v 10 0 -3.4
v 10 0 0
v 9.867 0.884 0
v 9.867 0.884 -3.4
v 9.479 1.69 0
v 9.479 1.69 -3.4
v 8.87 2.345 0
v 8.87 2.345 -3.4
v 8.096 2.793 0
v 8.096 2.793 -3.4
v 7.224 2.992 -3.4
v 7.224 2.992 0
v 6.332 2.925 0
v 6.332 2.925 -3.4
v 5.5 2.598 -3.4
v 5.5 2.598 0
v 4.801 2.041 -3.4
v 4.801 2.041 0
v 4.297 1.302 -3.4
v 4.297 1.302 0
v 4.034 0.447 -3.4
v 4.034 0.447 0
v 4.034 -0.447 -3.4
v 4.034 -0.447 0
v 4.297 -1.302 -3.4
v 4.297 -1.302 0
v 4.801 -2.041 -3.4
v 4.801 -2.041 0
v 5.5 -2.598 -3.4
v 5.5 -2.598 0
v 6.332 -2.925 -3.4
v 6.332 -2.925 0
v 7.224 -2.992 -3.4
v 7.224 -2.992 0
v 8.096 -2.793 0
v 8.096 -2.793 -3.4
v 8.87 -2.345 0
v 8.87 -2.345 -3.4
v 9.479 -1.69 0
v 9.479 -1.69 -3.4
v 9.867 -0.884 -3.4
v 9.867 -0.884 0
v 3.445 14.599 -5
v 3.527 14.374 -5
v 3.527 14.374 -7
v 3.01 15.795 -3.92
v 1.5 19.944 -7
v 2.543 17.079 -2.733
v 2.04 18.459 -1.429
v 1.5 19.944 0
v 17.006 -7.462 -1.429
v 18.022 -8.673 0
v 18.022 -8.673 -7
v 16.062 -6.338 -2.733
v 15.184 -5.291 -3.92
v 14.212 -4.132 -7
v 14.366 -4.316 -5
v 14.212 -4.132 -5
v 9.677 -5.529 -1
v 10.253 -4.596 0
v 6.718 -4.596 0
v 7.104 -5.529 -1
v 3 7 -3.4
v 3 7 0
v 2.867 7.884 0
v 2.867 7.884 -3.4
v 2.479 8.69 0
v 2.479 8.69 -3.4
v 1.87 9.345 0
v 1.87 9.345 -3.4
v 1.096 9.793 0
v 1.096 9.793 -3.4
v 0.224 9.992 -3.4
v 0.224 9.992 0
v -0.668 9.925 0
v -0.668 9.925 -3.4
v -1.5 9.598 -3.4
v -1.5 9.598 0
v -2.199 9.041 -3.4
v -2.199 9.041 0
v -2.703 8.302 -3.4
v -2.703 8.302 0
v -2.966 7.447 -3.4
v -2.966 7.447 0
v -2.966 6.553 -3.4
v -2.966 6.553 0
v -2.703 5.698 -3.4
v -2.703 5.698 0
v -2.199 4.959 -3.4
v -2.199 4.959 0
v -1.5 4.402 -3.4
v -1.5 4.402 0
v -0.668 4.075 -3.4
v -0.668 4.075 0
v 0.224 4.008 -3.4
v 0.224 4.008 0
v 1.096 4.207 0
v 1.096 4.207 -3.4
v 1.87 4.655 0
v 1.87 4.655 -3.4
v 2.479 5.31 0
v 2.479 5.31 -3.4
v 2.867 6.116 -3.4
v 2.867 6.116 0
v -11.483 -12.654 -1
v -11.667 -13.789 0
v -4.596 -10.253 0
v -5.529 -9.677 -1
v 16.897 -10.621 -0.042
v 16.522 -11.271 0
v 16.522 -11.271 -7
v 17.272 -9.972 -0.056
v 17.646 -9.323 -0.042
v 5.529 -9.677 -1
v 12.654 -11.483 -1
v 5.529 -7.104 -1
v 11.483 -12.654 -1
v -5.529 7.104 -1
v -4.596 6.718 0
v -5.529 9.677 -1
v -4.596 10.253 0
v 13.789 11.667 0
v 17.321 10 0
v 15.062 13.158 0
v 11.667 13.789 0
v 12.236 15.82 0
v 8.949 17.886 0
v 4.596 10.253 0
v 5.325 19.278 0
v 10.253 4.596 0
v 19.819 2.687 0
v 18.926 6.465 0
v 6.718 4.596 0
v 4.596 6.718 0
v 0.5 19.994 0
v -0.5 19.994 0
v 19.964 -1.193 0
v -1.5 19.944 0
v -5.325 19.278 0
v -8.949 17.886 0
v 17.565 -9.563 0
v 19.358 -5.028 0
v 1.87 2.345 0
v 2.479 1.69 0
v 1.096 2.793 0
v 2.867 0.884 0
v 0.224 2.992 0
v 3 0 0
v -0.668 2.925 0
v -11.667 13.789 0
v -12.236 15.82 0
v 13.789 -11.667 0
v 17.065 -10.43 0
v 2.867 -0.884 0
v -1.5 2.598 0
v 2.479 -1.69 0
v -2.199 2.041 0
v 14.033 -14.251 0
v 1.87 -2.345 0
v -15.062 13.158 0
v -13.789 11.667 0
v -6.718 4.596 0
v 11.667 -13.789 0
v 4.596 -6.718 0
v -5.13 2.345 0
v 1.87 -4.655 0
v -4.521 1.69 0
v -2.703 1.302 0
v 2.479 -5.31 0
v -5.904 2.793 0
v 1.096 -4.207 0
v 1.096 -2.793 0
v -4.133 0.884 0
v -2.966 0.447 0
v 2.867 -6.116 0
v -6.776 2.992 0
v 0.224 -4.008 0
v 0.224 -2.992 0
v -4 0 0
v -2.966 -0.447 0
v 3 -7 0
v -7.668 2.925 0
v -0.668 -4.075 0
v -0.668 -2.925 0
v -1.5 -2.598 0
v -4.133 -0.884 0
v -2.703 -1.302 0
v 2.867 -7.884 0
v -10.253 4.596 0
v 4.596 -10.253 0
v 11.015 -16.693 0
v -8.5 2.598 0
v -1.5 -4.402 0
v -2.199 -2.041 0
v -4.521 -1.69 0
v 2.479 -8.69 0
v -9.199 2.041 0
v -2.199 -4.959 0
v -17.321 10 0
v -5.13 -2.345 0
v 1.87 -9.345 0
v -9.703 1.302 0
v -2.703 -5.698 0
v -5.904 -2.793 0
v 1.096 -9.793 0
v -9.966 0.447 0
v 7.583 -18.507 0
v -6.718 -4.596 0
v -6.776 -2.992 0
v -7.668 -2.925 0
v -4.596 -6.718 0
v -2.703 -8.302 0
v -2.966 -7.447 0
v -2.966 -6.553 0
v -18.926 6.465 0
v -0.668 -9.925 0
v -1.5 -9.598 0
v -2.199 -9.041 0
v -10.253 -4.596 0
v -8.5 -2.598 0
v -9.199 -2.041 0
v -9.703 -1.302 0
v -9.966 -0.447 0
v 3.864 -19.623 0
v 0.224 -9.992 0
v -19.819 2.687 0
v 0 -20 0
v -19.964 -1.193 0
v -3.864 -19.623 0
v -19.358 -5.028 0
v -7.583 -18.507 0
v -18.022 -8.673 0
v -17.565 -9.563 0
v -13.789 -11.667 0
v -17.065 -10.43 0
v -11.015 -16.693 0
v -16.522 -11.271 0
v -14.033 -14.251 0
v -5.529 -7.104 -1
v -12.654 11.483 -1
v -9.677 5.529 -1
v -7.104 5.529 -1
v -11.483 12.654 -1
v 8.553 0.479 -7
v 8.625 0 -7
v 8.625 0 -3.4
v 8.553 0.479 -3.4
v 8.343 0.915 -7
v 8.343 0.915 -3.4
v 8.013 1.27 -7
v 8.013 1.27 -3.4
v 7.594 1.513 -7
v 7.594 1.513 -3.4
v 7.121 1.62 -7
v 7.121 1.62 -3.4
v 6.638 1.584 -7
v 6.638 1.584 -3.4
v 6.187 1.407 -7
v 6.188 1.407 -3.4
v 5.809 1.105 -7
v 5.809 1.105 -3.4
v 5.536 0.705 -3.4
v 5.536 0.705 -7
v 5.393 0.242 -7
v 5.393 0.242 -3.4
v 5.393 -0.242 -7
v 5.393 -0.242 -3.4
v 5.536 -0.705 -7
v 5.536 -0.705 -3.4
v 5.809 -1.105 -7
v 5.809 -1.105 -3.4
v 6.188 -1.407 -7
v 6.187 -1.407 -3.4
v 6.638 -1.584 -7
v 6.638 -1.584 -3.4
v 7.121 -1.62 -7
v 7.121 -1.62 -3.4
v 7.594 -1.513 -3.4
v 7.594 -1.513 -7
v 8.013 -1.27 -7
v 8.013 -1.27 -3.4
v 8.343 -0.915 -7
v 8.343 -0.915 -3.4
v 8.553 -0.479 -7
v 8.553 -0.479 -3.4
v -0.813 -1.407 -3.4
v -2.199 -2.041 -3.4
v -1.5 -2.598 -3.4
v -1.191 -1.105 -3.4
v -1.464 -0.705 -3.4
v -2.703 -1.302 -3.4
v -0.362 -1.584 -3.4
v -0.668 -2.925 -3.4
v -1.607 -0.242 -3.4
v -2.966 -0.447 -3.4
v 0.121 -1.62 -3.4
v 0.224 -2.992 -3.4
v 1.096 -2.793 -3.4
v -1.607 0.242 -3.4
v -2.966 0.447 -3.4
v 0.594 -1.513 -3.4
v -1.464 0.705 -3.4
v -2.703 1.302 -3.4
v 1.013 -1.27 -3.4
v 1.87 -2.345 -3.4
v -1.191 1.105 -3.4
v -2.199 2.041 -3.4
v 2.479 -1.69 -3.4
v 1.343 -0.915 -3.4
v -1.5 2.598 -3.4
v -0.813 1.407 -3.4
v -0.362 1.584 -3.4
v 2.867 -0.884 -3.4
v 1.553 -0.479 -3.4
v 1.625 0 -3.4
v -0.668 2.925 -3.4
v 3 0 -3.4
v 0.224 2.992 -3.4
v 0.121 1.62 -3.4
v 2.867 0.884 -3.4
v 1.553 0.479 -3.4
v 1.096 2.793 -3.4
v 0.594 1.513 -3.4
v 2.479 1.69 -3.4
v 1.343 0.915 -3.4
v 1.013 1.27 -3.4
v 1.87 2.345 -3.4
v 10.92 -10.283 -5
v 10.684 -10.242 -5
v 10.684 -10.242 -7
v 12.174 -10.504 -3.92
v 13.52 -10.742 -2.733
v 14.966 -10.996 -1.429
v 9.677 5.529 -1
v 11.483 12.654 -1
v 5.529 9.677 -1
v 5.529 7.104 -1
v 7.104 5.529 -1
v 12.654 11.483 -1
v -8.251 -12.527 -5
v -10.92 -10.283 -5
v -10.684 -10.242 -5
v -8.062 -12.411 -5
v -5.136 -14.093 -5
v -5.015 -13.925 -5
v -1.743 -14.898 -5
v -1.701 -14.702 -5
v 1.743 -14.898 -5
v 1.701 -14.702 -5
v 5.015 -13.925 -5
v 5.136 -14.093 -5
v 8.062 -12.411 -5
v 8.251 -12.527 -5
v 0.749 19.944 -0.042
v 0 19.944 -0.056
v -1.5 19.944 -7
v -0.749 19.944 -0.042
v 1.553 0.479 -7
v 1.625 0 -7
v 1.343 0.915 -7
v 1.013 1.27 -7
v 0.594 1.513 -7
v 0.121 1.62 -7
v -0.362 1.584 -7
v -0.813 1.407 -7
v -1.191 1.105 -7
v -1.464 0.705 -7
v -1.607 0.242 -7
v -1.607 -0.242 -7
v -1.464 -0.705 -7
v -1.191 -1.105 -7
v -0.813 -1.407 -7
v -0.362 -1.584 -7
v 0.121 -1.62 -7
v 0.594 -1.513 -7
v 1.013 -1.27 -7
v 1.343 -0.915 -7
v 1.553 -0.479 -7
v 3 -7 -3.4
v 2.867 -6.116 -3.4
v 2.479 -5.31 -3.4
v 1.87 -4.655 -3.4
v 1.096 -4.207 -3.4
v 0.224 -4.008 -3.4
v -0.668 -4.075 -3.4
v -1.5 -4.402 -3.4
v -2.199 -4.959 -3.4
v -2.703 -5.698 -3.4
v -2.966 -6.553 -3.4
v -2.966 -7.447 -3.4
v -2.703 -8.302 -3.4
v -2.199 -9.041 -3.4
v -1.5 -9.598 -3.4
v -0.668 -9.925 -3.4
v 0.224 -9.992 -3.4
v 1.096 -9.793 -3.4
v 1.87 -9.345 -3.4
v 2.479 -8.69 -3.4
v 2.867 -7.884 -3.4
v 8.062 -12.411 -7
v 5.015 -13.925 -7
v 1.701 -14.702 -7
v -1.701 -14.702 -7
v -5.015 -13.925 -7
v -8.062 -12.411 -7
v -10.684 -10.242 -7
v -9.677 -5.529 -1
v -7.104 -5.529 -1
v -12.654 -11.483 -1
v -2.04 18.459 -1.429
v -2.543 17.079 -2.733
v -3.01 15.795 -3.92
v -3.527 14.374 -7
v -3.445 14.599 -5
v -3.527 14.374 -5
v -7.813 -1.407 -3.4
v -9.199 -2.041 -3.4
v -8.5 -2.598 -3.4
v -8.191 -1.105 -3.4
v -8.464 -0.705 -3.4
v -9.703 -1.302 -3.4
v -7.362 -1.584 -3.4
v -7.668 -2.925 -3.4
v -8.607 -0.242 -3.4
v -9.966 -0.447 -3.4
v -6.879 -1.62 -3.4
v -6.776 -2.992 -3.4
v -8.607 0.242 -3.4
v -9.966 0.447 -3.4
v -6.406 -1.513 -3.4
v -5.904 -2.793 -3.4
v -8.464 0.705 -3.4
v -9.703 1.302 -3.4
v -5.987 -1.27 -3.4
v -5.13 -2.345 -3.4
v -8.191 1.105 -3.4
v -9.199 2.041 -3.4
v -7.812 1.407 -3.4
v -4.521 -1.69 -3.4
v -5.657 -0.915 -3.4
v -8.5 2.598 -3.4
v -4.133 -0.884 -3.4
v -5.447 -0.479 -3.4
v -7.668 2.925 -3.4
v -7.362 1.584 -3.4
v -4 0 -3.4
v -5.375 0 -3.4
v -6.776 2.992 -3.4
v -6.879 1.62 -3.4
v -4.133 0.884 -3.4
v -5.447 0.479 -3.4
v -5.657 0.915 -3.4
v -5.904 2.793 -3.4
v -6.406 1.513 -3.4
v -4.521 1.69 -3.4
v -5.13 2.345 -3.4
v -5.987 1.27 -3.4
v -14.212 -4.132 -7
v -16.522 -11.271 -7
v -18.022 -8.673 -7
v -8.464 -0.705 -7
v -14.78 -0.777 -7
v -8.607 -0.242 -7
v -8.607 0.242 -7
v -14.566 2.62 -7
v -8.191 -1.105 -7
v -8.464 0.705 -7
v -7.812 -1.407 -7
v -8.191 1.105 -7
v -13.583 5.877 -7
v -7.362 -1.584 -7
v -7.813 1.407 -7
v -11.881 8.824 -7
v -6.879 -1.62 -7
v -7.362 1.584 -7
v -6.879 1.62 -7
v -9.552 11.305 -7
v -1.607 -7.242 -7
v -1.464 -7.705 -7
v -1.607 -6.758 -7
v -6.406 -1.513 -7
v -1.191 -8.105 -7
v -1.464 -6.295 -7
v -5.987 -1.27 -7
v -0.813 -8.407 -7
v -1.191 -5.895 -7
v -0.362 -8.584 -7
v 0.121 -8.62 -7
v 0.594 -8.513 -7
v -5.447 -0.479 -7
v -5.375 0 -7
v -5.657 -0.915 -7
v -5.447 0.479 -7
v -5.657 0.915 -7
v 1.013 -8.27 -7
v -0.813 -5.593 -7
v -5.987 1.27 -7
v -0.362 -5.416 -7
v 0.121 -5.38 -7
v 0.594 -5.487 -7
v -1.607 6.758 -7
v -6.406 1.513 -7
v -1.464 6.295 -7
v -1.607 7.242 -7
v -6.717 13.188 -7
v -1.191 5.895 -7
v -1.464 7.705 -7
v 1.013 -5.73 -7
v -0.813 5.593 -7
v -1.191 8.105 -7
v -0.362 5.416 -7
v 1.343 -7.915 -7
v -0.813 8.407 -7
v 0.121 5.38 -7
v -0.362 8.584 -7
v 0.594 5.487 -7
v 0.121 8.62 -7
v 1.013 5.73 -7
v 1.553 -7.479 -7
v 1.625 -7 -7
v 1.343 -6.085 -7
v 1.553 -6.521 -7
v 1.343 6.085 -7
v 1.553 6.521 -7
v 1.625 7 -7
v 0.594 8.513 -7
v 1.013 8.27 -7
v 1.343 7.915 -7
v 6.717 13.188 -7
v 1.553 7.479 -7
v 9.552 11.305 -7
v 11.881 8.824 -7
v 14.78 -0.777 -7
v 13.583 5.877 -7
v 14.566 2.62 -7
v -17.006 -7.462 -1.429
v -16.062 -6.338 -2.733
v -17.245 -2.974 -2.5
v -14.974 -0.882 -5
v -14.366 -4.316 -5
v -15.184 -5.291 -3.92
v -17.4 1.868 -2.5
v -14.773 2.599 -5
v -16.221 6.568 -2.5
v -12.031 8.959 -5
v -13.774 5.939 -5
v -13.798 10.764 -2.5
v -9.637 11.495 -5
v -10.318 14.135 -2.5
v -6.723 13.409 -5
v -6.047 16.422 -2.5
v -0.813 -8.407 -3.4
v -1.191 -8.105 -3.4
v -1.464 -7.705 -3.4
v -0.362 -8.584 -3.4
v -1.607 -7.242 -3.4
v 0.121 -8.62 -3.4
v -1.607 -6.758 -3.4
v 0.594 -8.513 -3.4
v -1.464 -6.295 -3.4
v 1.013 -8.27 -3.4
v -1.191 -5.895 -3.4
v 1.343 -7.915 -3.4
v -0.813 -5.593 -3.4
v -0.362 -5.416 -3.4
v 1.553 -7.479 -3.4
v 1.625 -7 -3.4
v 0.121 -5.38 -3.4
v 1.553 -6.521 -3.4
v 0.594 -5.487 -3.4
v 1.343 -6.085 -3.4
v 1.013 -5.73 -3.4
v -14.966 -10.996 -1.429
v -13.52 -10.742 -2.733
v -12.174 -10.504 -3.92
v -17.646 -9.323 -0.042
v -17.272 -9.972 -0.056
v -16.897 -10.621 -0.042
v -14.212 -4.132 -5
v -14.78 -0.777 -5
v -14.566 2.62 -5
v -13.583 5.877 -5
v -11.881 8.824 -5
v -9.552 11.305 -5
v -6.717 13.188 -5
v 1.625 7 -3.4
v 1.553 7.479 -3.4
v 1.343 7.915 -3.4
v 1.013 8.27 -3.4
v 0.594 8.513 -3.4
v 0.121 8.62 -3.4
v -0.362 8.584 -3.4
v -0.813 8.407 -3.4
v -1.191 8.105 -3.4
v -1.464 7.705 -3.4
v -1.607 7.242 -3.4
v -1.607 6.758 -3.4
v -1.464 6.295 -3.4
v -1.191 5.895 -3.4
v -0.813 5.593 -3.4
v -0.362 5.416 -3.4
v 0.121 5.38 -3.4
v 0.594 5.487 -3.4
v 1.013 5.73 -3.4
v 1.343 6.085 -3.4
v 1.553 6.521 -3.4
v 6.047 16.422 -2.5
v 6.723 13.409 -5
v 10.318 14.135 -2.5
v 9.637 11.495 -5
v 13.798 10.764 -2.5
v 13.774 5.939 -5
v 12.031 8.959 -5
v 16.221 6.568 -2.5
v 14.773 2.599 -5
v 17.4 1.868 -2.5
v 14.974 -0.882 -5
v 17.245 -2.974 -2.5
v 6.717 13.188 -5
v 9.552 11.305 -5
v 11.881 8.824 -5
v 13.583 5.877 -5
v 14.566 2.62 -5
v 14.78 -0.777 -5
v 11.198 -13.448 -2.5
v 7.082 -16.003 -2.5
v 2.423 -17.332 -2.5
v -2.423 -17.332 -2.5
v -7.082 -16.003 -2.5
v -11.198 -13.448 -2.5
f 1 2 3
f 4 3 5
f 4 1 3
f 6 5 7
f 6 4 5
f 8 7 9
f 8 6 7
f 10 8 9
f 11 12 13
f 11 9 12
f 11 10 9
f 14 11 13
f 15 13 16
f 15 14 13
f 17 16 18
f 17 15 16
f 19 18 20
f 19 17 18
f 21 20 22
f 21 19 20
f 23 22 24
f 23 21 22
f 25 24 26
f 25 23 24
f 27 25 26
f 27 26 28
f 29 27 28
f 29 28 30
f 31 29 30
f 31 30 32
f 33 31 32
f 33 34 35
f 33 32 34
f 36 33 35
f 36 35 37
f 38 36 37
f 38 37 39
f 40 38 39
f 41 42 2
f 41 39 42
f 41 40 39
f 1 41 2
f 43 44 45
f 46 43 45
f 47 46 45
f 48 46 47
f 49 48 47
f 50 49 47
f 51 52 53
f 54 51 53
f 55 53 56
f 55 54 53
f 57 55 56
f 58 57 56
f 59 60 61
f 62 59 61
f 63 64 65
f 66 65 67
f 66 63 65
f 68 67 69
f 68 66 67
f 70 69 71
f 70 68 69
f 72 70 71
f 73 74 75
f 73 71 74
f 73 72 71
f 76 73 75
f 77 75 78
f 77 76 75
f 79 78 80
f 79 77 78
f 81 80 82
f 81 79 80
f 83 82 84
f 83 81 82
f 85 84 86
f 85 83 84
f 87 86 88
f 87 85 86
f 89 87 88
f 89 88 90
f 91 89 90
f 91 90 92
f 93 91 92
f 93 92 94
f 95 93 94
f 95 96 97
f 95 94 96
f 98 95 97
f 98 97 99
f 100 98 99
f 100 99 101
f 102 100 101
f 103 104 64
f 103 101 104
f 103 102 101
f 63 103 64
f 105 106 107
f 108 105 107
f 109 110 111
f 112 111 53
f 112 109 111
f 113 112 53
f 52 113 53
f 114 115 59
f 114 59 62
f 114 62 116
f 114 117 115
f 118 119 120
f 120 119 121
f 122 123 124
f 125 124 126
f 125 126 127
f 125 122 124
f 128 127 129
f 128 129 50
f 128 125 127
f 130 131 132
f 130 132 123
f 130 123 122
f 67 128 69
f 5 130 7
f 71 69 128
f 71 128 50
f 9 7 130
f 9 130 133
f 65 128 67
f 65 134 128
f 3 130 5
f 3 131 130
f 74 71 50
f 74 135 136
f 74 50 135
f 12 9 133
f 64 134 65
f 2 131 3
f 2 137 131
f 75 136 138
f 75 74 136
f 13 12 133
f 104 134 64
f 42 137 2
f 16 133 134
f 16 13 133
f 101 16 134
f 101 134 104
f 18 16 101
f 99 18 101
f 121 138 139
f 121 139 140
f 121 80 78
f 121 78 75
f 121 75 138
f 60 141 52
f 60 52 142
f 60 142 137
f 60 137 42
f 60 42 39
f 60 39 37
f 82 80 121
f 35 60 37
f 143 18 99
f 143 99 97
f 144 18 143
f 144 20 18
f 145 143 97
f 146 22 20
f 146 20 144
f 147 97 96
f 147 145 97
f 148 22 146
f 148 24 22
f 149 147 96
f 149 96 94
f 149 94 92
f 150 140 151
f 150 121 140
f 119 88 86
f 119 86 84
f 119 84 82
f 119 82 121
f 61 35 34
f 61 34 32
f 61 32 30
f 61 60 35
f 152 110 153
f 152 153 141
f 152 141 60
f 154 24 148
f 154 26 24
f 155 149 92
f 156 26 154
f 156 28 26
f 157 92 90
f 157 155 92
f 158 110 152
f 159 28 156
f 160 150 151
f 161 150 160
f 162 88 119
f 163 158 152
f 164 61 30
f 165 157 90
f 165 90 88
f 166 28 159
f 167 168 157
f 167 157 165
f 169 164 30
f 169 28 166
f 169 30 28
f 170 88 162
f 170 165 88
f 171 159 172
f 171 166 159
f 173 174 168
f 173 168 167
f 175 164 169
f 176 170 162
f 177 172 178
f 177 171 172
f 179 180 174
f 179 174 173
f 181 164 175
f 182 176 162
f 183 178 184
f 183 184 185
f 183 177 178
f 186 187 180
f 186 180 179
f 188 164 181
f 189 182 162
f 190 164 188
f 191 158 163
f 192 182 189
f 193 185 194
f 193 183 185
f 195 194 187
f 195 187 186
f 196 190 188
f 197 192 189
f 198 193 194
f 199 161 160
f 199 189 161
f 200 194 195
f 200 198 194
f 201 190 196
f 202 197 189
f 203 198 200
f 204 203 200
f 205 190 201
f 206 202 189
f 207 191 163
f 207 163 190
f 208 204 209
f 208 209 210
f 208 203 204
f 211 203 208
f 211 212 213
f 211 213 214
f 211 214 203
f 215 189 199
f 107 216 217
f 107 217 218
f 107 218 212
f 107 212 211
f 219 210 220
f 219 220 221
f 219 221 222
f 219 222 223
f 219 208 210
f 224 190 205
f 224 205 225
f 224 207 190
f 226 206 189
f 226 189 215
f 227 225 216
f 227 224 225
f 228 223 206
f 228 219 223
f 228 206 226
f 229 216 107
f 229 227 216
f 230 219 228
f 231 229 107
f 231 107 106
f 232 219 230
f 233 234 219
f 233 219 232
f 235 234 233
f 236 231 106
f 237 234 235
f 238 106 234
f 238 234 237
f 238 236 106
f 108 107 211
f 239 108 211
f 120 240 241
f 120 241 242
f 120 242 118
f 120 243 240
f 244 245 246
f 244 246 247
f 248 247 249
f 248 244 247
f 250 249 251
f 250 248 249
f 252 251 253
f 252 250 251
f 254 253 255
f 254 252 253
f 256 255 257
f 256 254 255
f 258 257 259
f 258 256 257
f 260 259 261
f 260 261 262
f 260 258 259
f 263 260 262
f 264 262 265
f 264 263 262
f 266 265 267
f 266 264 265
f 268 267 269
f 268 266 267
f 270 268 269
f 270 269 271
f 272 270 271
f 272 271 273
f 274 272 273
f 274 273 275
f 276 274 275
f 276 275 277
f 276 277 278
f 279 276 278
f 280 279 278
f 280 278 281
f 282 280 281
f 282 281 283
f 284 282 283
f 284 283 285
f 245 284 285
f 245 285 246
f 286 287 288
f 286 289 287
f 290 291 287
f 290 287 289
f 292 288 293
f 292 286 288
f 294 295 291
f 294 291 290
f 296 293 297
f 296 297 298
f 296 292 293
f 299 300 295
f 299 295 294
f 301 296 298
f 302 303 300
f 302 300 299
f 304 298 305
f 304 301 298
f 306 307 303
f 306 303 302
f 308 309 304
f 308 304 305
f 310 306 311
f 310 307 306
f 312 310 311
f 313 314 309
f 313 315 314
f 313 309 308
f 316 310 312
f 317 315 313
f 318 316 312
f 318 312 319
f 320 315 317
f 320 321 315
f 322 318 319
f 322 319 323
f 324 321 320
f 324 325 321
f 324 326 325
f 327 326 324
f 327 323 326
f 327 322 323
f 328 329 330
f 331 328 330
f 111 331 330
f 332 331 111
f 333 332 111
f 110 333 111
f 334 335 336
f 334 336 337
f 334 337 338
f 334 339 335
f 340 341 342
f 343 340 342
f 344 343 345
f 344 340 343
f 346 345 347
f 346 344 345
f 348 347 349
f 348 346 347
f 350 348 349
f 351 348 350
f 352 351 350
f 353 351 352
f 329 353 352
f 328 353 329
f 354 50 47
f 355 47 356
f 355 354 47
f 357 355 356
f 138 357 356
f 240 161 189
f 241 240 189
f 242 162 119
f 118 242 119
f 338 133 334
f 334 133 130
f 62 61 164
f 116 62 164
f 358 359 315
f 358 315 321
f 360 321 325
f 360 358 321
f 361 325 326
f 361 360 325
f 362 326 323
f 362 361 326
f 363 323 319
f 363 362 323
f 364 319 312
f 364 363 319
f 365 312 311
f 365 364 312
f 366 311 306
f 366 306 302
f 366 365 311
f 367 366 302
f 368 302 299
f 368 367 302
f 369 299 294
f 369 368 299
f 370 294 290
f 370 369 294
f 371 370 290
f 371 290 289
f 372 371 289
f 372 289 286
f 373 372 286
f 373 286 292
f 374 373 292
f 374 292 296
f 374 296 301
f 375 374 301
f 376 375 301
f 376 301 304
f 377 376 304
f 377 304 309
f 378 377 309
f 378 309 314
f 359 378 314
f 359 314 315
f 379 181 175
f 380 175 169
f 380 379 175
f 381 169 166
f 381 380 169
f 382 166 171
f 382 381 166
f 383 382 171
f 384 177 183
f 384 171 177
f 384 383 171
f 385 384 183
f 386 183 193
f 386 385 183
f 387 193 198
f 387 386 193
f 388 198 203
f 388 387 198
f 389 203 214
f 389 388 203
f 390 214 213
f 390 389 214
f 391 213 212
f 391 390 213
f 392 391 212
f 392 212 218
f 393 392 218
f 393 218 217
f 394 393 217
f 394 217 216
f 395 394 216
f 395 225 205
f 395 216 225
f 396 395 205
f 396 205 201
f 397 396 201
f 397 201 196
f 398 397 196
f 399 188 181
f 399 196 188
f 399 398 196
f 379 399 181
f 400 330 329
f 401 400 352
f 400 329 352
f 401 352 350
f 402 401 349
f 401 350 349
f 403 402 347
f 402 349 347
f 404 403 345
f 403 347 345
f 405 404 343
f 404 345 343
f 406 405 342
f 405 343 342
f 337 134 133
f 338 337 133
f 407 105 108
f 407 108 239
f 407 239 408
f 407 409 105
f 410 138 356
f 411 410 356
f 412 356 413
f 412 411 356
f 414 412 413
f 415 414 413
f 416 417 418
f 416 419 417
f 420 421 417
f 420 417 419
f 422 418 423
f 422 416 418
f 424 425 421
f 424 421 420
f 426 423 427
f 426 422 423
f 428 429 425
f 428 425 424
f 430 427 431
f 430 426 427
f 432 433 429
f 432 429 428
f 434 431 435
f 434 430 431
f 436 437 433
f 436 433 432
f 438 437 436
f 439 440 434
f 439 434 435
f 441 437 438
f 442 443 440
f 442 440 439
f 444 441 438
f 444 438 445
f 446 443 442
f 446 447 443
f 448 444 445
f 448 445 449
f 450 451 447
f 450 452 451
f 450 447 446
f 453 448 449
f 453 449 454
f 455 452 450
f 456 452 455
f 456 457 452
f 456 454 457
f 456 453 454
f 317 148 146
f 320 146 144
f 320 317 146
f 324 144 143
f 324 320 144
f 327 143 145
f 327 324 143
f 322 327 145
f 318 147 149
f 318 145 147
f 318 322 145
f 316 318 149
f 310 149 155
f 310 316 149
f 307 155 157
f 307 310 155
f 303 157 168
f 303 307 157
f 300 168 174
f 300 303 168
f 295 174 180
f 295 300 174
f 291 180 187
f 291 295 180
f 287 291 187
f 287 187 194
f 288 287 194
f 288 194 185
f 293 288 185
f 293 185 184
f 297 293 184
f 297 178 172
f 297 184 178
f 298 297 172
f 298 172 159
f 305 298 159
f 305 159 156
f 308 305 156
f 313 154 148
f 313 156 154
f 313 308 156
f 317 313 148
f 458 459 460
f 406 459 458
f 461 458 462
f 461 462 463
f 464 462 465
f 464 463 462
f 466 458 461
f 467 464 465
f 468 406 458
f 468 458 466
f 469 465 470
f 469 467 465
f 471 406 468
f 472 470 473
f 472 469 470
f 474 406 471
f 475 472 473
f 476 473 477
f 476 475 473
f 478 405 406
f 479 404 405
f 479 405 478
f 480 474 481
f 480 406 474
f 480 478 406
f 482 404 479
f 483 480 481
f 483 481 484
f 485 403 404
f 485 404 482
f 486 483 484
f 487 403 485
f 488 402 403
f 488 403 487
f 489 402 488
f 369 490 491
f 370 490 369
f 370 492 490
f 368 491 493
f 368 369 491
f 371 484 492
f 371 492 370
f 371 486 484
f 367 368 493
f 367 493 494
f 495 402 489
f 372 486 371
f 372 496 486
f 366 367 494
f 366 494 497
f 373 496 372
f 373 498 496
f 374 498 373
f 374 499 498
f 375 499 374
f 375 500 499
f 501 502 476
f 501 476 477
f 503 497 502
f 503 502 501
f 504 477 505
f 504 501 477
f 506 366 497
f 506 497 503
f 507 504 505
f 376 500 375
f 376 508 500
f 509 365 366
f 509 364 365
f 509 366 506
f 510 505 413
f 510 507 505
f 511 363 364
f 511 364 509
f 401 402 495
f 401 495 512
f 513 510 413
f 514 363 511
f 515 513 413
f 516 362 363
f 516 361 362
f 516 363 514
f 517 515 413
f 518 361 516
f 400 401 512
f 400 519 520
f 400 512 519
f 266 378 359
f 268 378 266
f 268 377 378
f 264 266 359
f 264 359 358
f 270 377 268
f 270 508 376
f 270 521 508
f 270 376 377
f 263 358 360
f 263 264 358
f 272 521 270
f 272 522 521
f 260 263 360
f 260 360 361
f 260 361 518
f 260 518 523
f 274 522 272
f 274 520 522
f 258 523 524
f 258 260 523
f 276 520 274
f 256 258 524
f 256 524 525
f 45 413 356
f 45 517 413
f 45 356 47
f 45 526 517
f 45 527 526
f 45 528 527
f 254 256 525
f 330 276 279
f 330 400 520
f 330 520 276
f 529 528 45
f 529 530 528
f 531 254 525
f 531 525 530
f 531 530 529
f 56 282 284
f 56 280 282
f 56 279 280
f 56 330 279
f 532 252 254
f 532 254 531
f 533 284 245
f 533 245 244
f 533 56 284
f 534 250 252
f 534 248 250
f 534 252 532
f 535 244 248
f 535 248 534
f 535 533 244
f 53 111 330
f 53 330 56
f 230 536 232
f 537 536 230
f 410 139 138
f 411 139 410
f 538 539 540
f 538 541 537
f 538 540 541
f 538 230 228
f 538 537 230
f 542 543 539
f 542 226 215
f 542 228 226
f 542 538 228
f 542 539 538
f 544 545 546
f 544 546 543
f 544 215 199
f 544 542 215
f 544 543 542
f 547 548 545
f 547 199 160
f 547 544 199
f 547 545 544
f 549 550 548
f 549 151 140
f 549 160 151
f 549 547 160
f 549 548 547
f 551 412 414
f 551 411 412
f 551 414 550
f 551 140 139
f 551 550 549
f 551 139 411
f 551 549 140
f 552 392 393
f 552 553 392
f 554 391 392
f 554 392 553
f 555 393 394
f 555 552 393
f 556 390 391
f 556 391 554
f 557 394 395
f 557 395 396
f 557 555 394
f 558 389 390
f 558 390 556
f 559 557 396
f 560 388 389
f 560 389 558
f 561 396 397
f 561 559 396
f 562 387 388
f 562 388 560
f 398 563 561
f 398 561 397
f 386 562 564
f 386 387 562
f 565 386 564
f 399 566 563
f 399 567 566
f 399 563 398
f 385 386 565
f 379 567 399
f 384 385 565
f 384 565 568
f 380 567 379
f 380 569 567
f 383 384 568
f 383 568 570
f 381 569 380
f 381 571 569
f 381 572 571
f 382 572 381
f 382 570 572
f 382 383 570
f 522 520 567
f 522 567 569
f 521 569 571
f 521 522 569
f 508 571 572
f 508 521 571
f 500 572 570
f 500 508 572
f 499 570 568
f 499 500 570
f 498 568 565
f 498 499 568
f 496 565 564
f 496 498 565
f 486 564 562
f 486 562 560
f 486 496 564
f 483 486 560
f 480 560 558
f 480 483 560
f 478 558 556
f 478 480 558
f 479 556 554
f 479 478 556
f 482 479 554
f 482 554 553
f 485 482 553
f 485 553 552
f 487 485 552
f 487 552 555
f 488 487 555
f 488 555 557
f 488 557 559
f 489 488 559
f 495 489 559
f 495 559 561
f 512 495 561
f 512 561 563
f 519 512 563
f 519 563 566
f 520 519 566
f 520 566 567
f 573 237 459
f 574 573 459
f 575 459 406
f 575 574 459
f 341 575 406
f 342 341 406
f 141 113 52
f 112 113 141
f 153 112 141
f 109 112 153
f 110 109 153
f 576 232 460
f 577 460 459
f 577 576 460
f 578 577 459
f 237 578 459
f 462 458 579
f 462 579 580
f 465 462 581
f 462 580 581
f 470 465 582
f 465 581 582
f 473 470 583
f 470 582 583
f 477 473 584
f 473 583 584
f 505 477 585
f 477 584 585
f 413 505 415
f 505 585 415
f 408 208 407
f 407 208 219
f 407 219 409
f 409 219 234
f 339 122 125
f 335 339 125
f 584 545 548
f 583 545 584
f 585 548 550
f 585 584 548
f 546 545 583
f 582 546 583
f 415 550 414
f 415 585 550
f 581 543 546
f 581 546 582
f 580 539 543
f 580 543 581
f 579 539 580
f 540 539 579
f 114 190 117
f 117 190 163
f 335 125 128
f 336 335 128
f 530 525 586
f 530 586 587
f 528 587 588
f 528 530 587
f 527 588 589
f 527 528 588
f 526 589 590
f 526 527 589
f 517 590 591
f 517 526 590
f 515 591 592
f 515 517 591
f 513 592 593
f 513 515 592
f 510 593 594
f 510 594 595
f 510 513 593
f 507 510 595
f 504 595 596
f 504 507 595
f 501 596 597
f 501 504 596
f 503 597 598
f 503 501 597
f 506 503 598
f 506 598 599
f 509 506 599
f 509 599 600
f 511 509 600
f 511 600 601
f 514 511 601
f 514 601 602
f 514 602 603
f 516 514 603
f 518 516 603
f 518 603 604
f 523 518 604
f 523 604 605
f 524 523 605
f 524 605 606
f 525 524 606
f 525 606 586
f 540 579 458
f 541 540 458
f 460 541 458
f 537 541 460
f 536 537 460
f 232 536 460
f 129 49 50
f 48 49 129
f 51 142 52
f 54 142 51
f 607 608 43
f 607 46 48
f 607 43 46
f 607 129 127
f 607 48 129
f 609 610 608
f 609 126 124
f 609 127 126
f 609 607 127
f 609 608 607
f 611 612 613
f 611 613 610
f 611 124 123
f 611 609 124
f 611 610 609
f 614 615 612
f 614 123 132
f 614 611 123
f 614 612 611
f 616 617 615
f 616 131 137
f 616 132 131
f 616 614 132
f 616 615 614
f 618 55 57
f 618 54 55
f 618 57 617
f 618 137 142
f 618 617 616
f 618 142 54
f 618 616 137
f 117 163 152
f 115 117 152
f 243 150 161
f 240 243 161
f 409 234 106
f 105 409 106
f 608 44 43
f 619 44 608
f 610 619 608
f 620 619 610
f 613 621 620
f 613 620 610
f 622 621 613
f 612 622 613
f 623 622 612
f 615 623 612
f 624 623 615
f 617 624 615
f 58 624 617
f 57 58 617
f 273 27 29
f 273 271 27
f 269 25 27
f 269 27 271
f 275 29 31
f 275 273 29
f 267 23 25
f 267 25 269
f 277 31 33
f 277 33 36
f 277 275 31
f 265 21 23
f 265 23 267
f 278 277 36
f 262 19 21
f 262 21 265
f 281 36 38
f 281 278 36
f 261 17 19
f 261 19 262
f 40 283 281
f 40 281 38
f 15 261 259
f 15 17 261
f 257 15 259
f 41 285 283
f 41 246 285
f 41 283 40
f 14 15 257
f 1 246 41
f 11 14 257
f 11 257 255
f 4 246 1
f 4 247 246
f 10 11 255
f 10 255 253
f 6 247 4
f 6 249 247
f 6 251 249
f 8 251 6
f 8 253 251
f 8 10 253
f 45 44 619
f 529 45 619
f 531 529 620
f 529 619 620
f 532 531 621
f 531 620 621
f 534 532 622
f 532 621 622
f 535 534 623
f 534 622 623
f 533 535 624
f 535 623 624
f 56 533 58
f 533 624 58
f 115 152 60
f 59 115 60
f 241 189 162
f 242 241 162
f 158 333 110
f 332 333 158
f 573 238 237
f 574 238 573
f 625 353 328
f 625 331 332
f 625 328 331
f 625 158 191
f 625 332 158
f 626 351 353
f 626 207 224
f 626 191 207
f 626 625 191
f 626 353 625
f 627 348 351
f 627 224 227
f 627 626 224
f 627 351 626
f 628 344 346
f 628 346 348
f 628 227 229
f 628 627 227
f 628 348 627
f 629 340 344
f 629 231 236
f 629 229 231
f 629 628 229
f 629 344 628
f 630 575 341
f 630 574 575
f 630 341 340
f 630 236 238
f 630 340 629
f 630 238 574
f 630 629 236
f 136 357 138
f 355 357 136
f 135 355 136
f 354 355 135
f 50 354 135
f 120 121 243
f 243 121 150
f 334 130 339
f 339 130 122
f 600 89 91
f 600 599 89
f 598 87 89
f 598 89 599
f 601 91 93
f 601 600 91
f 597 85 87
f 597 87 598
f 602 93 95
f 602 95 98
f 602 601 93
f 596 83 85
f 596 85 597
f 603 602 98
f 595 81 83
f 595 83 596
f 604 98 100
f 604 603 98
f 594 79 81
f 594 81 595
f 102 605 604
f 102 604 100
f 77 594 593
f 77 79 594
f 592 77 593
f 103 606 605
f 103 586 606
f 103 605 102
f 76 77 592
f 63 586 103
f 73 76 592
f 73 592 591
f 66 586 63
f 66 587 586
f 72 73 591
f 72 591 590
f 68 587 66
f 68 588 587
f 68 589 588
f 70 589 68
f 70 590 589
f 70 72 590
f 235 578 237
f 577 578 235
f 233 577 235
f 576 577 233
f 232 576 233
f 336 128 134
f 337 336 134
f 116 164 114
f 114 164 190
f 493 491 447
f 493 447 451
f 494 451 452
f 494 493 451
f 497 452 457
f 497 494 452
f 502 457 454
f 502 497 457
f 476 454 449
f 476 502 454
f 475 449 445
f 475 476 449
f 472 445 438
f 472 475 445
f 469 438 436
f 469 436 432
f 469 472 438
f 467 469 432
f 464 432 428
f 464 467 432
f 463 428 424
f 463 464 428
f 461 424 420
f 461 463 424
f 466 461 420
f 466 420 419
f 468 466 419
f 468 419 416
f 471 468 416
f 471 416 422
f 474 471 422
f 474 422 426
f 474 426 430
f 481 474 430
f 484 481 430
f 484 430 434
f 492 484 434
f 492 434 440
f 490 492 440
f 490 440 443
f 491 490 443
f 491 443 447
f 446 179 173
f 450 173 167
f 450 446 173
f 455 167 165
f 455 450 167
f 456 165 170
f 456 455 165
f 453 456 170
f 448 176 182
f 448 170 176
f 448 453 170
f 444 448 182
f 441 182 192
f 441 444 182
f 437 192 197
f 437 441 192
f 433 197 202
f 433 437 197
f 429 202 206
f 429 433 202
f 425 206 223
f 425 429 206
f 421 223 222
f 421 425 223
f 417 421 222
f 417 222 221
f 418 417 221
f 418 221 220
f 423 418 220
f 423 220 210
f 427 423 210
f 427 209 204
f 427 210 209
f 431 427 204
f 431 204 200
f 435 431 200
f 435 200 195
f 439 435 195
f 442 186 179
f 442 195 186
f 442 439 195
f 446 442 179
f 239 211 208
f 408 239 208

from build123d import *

# Parameters (mm, degrees)
ESQUISSE3_R                         = 14.8
BOSS_EXTRU_1_DEPTH                  = 2
BOSS_EXTRU_2_REACH                  = 31.138
R_P_TITION_CIRCULAIRE1_COUNT        = 3
ENL_V_MAT_EXTRU_1_DEPTH             = 30.137604569
ENL_V_MAT_EXTRU_1_DEPTH_BACK        = 30.137604569
ESQUISSE5_R                         = 1.625
PER_AGEAVANC_1_START                = -3.4
PER_AGEAVANC_1_OUTLINE_R            = 3
PER_AGEAVANC_1_OUTLINE_R_2          = 1.625
PER_AGEAVANC_1_DEPTH                = 3.4000121
ENL_V_MAT_EXTRU_2_DEPTH             = 1
ENL_V_MAT_EXTRU_2_DRAFT             = -43
R_P_TITION_CIRCULAIRE2_COPY_1_DEPTH = 1
R_P_TITION_CIRCULAIRE2_COPY_1_DRAFT = -43
R_P_TITION_CIRCULAIRE2_COPY_2_DEPTH = 1
R_P_TITION_CIRCULAIRE2_COPY_2_DRAFT = -43
R_P_TITION_CIRCULAIRE2_COPY_3_DEPTH = 1
R_P_TITION_CIRCULAIRE2_COPY_3_DRAFT = -43


with BuildPart() as part:
    # Esquisse2 → Révolution1 (revolve)
    with BuildSketch(Plane(origin=(0, 0, 0), x_dir=(0, 0, -1), z_dir=(1, 0, 0)), mode=Mode.PRIVATE) as r_volution1_sk:
        Polygon((0, 0), (0, 20), (5, 15), (5, 0), align=None)
    revolve(r_volution1_sk.sketch.rotate(Axis((0, 0, 0), (0, 0, -1)), 90), axis=Axis((0, 0, 0), (0, 0, -1)))

    # Esquisse3 → Boss.-Extru.1 (add)
    with BuildSketch(Plane(origin=(0, 0, -5), x_dir=(-1, 0, 0), z_dir=(0, 0, -1))):
        Circle(ESQUISSE3_R)
    extrude(amount=BOSS_EXTRU_1_DEPTH)

    # Boss.-Extru.2: up to this face of the body (flat: up to its plane)
    boss_extru_2_end = Plane(part.part.faces().sort_by_distance((0, 0, -7))[0])
    # Esquisse4 → Boss.-Extru.2 (add, up to the picked face)
    with BuildSketch(Plane.XY, mode=Mode.PRIVATE) as boss_extru_2_sk1:
        with BuildLine():
            Line((1.5, 19.943670675), (-1.5, 19.943670675))
            Line((-1.5, 19.943670675), (-3.52737474, 14.373504355))
            ThreePointArc((-3.52737474, 14.373504355), (0, 14.8), (3.52737474, 14.373504355))
            Line((3.52737474, 14.373504355), (1.5, 19.943670675))
        make_face()
    boss_extru_2_tool1 = split(extrude(boss_extru_2_sk1.sketch, amount=-BOSS_EXTRU_2_REACH, mode=Mode.PRIVATE), bisect_by=boss_extru_2_end, keep=Keep.BOTH, mode=Mode.PRIVATE)
    boss_extru_2 = boss_extru_2_tool1.solids().sort_by(Axis((0, 16.957577, 0), (0, 0, -1)))[0]
    add(boss_extru_2)

    # Répétition circulaire1: Boss.-Extru.2 ×3 about axis
    r_p_tition_circulaire1_axis = Axis((0, 0, 0), (0, 0, 1))
    for i in range(1, R_P_TITION_CIRCULAIRE1_COUNT):
        add(boss_extru_2.rotate(r_p_tition_circulaire1_axis, i * 360 / R_P_TITION_CIRCULAIRE1_COUNT))

    # Esquisse5 → Enlèv. mat.-Extru.1 (cut, two sides: drawn at the far end of the back side and taken through both)
    with BuildSketch(Plane.XY.offset(-ENL_V_MAT_EXTRU_1_DEPTH_BACK)):
        with Locations((0, 7)):
            Circle(ESQUISSE5_R)
        Circle(ESQUISSE5_R)
        with Locations((7, 0)):
            Circle(ESQUISSE5_R)
        with Locations((0, -7)):
            Circle(ESQUISSE5_R)
        with Locations((-7, 0)):
            Circle(ESQUISSE5_R)
    extrude(amount=ENL_V_MAT_EXTRU_1_DEPTH + ENL_V_MAT_EXTRU_1_DEPTH_BACK, mode=Mode.SUBTRACT)

    # PerçageAvancé1: read off the stored shape, not the designer's step
    # PerçageAvancé1 outline → PerçageAvancé1 (cut)
    # profile 1 of 5: a face of its own
    with BuildSketch(Plane.XY.offset(PER_AGEAVANC_1_START)):
        with Locations((0, -7)):
            Circle(PER_AGEAVANC_1_OUTLINE_R)
        with Locations((0, -7)):
            Circle(PER_AGEAVANC_1_OUTLINE_R_2, mode=Mode.SUBTRACT)
    # profile 2 of 5: a face of its own
    with BuildSketch(Plane.XY.offset(PER_AGEAVANC_1_START)):
        with Locations((7, 0)):
            Circle(PER_AGEAVANC_1_OUTLINE_R)
        with Locations((7, 0)):
            Circle(PER_AGEAVANC_1_OUTLINE_R_2, mode=Mode.SUBTRACT)
    # profile 3 of 5: a face of its own
    with BuildSketch(Plane.XY.offset(PER_AGEAVANC_1_START)):
        Circle(PER_AGEAVANC_1_OUTLINE_R)
        Circle(PER_AGEAVANC_1_OUTLINE_R_2, mode=Mode.SUBTRACT)
    # profile 4 of 5: a face of its own
    with BuildSketch(Plane.XY.offset(PER_AGEAVANC_1_START)):
        with Locations((0, 7)):
            Circle(PER_AGEAVANC_1_OUTLINE_R)
        with Locations((0, 7)):
            Circle(PER_AGEAVANC_1_OUTLINE_R_2, mode=Mode.SUBTRACT)
    # profile 5 of 5: a face of its own
    with BuildSketch(Plane.XY.offset(PER_AGEAVANC_1_START)):
        with Locations((-7, 0)):
            Circle(PER_AGEAVANC_1_OUTLINE_R)
        with Locations((-7, 0)):
            Circle(PER_AGEAVANC_1_OUTLINE_R_2, mode=Mode.SUBTRACT)
    extrude(amount=PER_AGEAVANC_1_DEPTH, mode=Mode.SUBTRACT)


with BuildPart() as enl_v_mat_extru_2_tool:
    # Esquisse9 → Enlèv. mat.-Extru.2 (with draft: the straight prism first)
    with BuildSketch(Plane.XY):
        Polygon((-13.788582233, 11.66726189), (-10.253048327, 4.596194078), (-6.717514421, 4.596194078), (-4.596194078, 6.717514421), (-4.596194078, 10.253048327), (-11.66726189, 13.788582233), align=None)
    extrude(amount=-ENL_V_MAT_EXTRU_2_DEPTH)
    # Enlèv. mat.-Extru.2: the draft: its side faces are tilted about the plane it starts from
    enl_v_mat_extru_2_sides = [enl_v_mat_extru_2_tool.faces().sort_by_distance(p)[0] for p in [
        (-12.02081528, 8.131727984, -0.5),
        (-8.485281374, 4.596194078, -0.5),
        (-5.656854249, 5.656854249, -0.5),
        (-4.596194078, 8.485281374, -0.5),
        (-8.131727984, 12.02081528, -0.5),
        (-12.727922061, 12.727922061, -0.5),
    ]]
    draft(enl_v_mat_extru_2_sides, Plane.XY, ENL_V_MAT_EXTRU_2_DRAFT)


with BuildPart() as part_1:
    add(part.part)

    # Enlèv. mat.-Extru.2: cut by enl_v_mat_extru_2_tool
    add(enl_v_mat_extru_2_tool.part, mode=Mode.SUBTRACT)


with BuildPart() as r_p_tition_circulaire2_copy_1_tool:
    # Répétition circulaire2 copy 1 sketch → Répétition circulaire2 copy 1 (with draft: the straight prism first)
    with BuildSketch(Plane(origin=(0, 0, 0), x_dir=(0, 1, 0), z_dir=(0, 0, 1))):
        Polygon((-13.788582233, 11.66726189), (-10.253048327, 4.596194078), (-6.717514421, 4.596194078), (-4.596194078, 6.717514421), (-4.596194078, 10.253048327), (-11.66726189, 13.788582233), align=None)
    extrude(amount=-R_P_TITION_CIRCULAIRE2_COPY_1_DEPTH)
    # Répétition circulaire2 copy 1: the draft: its side faces are tilted about the plane it starts from
    r_p_tition_circulaire2_copy_1_sides = [r_p_tition_circulaire2_copy_1_tool.faces().sort_by_distance(p)[0] for p in [
        (-8.131727984, -12.02081528, -0.5),
        (-4.596194078, -8.485281374, -0.5),
        (-5.656854249, -5.656854249, -0.5),
        (-8.485281374, -4.596194078, -0.5),
        (-12.02081528, -8.131727984, -0.5),
        (-12.727922061, -12.727922061, -0.5),
    ]]
    draft(r_p_tition_circulaire2_copy_1_sides, Plane(origin=(0, 0, 0), x_dir=(0, 1, 0), z_dir=(0, 0, 1)), R_P_TITION_CIRCULAIRE2_COPY_1_DRAFT)


with BuildPart() as part_2:
    add(part_1.part)

    # Répétition circulaire2 copy 1: cut by r_p_tition_circulaire2_copy_1_tool
    add(r_p_tition_circulaire2_copy_1_tool.part, mode=Mode.SUBTRACT)


with BuildPart() as r_p_tition_circulaire2_copy_2_tool:
    # Répétition circulaire2 copy 2 sketch → Répétition circulaire2 copy 2 (with draft: the straight prism first)
    with BuildSketch(Plane(origin=(0, 0, 0), x_dir=(-1, 0, 0), z_dir=(0, 0, 1))):
        Polygon((-13.788582233, 11.66726189), (-10.253048327, 4.596194078), (-6.717514421, 4.596194078), (-4.596194078, 6.717514421), (-4.596194078, 10.253048327), (-11.66726189, 13.788582233), align=None)
    extrude(amount=-R_P_TITION_CIRCULAIRE2_COPY_2_DEPTH)
    # Répétition circulaire2 copy 2: the draft: its side faces are tilted about the plane it starts from
    r_p_tition_circulaire2_copy_2_sides = [r_p_tition_circulaire2_copy_2_tool.faces().sort_by_distance(p)[0] for p in [
        (12.02081528, -8.131727984, -0.5),
        (8.485281374, -4.596194078, -0.5),
        (5.656854249, -5.656854249, -0.5),
        (4.596194078, -8.485281374, -0.5),
        (8.131727984, -12.02081528, -0.5),
        (12.727922061, -12.727922061, -0.5),
    ]]
    draft(r_p_tition_circulaire2_copy_2_sides, Plane(origin=(0, 0, 0), x_dir=(-1, 0, 0), z_dir=(0, 0, 1)), R_P_TITION_CIRCULAIRE2_COPY_2_DRAFT)


with BuildPart() as part_3:
    add(part_2.part)

    # Répétition circulaire2 copy 2: cut by r_p_tition_circulaire2_copy_2_tool
    add(r_p_tition_circulaire2_copy_2_tool.part, mode=Mode.SUBTRACT)


with BuildPart() as r_p_tition_circulaire2_copy_3_tool:
    # Répétition circulaire2 copy 3 sketch → Répétition circulaire2 copy 3 (with draft: the straight prism first)
    with BuildSketch(Plane(origin=(0, 0, 0), x_dir=(0, -1, 0), z_dir=(0, 0, 1))):
        Polygon((-13.788582233, 11.66726189), (-10.253048327, 4.596194078), (-6.717514421, 4.596194078), (-4.596194078, 6.717514421), (-4.596194078, 10.253048327), (-11.66726189, 13.788582233), align=None)
    extrude(amount=-R_P_TITION_CIRCULAIRE2_COPY_3_DEPTH)
    # Répétition circulaire2 copy 3: the draft: its side faces are tilted about the plane it starts from
    r_p_tition_circulaire2_copy_3_sides = [r_p_tition_circulaire2_copy_3_tool.faces().sort_by_distance(p)[0] for p in [
        (8.131727984, 12.02081528, -0.5),
        (4.596194078, 8.485281374, -0.5),
        (5.656854249, 5.656854249, -0.5),
        (8.485281374, 4.596194078, -0.5),
        (12.02081528, 8.131727984, -0.5),
        (12.727922061, 12.727922061, -0.5),
    ]]
    draft(r_p_tition_circulaire2_copy_3_sides, Plane(origin=(0, 0, 0), x_dir=(0, -1, 0), z_dir=(0, 0, 1)), R_P_TITION_CIRCULAIRE2_COPY_3_DRAFT)


with BuildPart() as part_4:
    add(part_3.part)

    # Répétition circulaire2 copy 3: cut by r_p_tition_circulaire2_copy_3_tool
    add(r_p_tition_circulaire2_copy_3_tool.part, mode=Mode.SUBTRACT)


solid = part_4.part
